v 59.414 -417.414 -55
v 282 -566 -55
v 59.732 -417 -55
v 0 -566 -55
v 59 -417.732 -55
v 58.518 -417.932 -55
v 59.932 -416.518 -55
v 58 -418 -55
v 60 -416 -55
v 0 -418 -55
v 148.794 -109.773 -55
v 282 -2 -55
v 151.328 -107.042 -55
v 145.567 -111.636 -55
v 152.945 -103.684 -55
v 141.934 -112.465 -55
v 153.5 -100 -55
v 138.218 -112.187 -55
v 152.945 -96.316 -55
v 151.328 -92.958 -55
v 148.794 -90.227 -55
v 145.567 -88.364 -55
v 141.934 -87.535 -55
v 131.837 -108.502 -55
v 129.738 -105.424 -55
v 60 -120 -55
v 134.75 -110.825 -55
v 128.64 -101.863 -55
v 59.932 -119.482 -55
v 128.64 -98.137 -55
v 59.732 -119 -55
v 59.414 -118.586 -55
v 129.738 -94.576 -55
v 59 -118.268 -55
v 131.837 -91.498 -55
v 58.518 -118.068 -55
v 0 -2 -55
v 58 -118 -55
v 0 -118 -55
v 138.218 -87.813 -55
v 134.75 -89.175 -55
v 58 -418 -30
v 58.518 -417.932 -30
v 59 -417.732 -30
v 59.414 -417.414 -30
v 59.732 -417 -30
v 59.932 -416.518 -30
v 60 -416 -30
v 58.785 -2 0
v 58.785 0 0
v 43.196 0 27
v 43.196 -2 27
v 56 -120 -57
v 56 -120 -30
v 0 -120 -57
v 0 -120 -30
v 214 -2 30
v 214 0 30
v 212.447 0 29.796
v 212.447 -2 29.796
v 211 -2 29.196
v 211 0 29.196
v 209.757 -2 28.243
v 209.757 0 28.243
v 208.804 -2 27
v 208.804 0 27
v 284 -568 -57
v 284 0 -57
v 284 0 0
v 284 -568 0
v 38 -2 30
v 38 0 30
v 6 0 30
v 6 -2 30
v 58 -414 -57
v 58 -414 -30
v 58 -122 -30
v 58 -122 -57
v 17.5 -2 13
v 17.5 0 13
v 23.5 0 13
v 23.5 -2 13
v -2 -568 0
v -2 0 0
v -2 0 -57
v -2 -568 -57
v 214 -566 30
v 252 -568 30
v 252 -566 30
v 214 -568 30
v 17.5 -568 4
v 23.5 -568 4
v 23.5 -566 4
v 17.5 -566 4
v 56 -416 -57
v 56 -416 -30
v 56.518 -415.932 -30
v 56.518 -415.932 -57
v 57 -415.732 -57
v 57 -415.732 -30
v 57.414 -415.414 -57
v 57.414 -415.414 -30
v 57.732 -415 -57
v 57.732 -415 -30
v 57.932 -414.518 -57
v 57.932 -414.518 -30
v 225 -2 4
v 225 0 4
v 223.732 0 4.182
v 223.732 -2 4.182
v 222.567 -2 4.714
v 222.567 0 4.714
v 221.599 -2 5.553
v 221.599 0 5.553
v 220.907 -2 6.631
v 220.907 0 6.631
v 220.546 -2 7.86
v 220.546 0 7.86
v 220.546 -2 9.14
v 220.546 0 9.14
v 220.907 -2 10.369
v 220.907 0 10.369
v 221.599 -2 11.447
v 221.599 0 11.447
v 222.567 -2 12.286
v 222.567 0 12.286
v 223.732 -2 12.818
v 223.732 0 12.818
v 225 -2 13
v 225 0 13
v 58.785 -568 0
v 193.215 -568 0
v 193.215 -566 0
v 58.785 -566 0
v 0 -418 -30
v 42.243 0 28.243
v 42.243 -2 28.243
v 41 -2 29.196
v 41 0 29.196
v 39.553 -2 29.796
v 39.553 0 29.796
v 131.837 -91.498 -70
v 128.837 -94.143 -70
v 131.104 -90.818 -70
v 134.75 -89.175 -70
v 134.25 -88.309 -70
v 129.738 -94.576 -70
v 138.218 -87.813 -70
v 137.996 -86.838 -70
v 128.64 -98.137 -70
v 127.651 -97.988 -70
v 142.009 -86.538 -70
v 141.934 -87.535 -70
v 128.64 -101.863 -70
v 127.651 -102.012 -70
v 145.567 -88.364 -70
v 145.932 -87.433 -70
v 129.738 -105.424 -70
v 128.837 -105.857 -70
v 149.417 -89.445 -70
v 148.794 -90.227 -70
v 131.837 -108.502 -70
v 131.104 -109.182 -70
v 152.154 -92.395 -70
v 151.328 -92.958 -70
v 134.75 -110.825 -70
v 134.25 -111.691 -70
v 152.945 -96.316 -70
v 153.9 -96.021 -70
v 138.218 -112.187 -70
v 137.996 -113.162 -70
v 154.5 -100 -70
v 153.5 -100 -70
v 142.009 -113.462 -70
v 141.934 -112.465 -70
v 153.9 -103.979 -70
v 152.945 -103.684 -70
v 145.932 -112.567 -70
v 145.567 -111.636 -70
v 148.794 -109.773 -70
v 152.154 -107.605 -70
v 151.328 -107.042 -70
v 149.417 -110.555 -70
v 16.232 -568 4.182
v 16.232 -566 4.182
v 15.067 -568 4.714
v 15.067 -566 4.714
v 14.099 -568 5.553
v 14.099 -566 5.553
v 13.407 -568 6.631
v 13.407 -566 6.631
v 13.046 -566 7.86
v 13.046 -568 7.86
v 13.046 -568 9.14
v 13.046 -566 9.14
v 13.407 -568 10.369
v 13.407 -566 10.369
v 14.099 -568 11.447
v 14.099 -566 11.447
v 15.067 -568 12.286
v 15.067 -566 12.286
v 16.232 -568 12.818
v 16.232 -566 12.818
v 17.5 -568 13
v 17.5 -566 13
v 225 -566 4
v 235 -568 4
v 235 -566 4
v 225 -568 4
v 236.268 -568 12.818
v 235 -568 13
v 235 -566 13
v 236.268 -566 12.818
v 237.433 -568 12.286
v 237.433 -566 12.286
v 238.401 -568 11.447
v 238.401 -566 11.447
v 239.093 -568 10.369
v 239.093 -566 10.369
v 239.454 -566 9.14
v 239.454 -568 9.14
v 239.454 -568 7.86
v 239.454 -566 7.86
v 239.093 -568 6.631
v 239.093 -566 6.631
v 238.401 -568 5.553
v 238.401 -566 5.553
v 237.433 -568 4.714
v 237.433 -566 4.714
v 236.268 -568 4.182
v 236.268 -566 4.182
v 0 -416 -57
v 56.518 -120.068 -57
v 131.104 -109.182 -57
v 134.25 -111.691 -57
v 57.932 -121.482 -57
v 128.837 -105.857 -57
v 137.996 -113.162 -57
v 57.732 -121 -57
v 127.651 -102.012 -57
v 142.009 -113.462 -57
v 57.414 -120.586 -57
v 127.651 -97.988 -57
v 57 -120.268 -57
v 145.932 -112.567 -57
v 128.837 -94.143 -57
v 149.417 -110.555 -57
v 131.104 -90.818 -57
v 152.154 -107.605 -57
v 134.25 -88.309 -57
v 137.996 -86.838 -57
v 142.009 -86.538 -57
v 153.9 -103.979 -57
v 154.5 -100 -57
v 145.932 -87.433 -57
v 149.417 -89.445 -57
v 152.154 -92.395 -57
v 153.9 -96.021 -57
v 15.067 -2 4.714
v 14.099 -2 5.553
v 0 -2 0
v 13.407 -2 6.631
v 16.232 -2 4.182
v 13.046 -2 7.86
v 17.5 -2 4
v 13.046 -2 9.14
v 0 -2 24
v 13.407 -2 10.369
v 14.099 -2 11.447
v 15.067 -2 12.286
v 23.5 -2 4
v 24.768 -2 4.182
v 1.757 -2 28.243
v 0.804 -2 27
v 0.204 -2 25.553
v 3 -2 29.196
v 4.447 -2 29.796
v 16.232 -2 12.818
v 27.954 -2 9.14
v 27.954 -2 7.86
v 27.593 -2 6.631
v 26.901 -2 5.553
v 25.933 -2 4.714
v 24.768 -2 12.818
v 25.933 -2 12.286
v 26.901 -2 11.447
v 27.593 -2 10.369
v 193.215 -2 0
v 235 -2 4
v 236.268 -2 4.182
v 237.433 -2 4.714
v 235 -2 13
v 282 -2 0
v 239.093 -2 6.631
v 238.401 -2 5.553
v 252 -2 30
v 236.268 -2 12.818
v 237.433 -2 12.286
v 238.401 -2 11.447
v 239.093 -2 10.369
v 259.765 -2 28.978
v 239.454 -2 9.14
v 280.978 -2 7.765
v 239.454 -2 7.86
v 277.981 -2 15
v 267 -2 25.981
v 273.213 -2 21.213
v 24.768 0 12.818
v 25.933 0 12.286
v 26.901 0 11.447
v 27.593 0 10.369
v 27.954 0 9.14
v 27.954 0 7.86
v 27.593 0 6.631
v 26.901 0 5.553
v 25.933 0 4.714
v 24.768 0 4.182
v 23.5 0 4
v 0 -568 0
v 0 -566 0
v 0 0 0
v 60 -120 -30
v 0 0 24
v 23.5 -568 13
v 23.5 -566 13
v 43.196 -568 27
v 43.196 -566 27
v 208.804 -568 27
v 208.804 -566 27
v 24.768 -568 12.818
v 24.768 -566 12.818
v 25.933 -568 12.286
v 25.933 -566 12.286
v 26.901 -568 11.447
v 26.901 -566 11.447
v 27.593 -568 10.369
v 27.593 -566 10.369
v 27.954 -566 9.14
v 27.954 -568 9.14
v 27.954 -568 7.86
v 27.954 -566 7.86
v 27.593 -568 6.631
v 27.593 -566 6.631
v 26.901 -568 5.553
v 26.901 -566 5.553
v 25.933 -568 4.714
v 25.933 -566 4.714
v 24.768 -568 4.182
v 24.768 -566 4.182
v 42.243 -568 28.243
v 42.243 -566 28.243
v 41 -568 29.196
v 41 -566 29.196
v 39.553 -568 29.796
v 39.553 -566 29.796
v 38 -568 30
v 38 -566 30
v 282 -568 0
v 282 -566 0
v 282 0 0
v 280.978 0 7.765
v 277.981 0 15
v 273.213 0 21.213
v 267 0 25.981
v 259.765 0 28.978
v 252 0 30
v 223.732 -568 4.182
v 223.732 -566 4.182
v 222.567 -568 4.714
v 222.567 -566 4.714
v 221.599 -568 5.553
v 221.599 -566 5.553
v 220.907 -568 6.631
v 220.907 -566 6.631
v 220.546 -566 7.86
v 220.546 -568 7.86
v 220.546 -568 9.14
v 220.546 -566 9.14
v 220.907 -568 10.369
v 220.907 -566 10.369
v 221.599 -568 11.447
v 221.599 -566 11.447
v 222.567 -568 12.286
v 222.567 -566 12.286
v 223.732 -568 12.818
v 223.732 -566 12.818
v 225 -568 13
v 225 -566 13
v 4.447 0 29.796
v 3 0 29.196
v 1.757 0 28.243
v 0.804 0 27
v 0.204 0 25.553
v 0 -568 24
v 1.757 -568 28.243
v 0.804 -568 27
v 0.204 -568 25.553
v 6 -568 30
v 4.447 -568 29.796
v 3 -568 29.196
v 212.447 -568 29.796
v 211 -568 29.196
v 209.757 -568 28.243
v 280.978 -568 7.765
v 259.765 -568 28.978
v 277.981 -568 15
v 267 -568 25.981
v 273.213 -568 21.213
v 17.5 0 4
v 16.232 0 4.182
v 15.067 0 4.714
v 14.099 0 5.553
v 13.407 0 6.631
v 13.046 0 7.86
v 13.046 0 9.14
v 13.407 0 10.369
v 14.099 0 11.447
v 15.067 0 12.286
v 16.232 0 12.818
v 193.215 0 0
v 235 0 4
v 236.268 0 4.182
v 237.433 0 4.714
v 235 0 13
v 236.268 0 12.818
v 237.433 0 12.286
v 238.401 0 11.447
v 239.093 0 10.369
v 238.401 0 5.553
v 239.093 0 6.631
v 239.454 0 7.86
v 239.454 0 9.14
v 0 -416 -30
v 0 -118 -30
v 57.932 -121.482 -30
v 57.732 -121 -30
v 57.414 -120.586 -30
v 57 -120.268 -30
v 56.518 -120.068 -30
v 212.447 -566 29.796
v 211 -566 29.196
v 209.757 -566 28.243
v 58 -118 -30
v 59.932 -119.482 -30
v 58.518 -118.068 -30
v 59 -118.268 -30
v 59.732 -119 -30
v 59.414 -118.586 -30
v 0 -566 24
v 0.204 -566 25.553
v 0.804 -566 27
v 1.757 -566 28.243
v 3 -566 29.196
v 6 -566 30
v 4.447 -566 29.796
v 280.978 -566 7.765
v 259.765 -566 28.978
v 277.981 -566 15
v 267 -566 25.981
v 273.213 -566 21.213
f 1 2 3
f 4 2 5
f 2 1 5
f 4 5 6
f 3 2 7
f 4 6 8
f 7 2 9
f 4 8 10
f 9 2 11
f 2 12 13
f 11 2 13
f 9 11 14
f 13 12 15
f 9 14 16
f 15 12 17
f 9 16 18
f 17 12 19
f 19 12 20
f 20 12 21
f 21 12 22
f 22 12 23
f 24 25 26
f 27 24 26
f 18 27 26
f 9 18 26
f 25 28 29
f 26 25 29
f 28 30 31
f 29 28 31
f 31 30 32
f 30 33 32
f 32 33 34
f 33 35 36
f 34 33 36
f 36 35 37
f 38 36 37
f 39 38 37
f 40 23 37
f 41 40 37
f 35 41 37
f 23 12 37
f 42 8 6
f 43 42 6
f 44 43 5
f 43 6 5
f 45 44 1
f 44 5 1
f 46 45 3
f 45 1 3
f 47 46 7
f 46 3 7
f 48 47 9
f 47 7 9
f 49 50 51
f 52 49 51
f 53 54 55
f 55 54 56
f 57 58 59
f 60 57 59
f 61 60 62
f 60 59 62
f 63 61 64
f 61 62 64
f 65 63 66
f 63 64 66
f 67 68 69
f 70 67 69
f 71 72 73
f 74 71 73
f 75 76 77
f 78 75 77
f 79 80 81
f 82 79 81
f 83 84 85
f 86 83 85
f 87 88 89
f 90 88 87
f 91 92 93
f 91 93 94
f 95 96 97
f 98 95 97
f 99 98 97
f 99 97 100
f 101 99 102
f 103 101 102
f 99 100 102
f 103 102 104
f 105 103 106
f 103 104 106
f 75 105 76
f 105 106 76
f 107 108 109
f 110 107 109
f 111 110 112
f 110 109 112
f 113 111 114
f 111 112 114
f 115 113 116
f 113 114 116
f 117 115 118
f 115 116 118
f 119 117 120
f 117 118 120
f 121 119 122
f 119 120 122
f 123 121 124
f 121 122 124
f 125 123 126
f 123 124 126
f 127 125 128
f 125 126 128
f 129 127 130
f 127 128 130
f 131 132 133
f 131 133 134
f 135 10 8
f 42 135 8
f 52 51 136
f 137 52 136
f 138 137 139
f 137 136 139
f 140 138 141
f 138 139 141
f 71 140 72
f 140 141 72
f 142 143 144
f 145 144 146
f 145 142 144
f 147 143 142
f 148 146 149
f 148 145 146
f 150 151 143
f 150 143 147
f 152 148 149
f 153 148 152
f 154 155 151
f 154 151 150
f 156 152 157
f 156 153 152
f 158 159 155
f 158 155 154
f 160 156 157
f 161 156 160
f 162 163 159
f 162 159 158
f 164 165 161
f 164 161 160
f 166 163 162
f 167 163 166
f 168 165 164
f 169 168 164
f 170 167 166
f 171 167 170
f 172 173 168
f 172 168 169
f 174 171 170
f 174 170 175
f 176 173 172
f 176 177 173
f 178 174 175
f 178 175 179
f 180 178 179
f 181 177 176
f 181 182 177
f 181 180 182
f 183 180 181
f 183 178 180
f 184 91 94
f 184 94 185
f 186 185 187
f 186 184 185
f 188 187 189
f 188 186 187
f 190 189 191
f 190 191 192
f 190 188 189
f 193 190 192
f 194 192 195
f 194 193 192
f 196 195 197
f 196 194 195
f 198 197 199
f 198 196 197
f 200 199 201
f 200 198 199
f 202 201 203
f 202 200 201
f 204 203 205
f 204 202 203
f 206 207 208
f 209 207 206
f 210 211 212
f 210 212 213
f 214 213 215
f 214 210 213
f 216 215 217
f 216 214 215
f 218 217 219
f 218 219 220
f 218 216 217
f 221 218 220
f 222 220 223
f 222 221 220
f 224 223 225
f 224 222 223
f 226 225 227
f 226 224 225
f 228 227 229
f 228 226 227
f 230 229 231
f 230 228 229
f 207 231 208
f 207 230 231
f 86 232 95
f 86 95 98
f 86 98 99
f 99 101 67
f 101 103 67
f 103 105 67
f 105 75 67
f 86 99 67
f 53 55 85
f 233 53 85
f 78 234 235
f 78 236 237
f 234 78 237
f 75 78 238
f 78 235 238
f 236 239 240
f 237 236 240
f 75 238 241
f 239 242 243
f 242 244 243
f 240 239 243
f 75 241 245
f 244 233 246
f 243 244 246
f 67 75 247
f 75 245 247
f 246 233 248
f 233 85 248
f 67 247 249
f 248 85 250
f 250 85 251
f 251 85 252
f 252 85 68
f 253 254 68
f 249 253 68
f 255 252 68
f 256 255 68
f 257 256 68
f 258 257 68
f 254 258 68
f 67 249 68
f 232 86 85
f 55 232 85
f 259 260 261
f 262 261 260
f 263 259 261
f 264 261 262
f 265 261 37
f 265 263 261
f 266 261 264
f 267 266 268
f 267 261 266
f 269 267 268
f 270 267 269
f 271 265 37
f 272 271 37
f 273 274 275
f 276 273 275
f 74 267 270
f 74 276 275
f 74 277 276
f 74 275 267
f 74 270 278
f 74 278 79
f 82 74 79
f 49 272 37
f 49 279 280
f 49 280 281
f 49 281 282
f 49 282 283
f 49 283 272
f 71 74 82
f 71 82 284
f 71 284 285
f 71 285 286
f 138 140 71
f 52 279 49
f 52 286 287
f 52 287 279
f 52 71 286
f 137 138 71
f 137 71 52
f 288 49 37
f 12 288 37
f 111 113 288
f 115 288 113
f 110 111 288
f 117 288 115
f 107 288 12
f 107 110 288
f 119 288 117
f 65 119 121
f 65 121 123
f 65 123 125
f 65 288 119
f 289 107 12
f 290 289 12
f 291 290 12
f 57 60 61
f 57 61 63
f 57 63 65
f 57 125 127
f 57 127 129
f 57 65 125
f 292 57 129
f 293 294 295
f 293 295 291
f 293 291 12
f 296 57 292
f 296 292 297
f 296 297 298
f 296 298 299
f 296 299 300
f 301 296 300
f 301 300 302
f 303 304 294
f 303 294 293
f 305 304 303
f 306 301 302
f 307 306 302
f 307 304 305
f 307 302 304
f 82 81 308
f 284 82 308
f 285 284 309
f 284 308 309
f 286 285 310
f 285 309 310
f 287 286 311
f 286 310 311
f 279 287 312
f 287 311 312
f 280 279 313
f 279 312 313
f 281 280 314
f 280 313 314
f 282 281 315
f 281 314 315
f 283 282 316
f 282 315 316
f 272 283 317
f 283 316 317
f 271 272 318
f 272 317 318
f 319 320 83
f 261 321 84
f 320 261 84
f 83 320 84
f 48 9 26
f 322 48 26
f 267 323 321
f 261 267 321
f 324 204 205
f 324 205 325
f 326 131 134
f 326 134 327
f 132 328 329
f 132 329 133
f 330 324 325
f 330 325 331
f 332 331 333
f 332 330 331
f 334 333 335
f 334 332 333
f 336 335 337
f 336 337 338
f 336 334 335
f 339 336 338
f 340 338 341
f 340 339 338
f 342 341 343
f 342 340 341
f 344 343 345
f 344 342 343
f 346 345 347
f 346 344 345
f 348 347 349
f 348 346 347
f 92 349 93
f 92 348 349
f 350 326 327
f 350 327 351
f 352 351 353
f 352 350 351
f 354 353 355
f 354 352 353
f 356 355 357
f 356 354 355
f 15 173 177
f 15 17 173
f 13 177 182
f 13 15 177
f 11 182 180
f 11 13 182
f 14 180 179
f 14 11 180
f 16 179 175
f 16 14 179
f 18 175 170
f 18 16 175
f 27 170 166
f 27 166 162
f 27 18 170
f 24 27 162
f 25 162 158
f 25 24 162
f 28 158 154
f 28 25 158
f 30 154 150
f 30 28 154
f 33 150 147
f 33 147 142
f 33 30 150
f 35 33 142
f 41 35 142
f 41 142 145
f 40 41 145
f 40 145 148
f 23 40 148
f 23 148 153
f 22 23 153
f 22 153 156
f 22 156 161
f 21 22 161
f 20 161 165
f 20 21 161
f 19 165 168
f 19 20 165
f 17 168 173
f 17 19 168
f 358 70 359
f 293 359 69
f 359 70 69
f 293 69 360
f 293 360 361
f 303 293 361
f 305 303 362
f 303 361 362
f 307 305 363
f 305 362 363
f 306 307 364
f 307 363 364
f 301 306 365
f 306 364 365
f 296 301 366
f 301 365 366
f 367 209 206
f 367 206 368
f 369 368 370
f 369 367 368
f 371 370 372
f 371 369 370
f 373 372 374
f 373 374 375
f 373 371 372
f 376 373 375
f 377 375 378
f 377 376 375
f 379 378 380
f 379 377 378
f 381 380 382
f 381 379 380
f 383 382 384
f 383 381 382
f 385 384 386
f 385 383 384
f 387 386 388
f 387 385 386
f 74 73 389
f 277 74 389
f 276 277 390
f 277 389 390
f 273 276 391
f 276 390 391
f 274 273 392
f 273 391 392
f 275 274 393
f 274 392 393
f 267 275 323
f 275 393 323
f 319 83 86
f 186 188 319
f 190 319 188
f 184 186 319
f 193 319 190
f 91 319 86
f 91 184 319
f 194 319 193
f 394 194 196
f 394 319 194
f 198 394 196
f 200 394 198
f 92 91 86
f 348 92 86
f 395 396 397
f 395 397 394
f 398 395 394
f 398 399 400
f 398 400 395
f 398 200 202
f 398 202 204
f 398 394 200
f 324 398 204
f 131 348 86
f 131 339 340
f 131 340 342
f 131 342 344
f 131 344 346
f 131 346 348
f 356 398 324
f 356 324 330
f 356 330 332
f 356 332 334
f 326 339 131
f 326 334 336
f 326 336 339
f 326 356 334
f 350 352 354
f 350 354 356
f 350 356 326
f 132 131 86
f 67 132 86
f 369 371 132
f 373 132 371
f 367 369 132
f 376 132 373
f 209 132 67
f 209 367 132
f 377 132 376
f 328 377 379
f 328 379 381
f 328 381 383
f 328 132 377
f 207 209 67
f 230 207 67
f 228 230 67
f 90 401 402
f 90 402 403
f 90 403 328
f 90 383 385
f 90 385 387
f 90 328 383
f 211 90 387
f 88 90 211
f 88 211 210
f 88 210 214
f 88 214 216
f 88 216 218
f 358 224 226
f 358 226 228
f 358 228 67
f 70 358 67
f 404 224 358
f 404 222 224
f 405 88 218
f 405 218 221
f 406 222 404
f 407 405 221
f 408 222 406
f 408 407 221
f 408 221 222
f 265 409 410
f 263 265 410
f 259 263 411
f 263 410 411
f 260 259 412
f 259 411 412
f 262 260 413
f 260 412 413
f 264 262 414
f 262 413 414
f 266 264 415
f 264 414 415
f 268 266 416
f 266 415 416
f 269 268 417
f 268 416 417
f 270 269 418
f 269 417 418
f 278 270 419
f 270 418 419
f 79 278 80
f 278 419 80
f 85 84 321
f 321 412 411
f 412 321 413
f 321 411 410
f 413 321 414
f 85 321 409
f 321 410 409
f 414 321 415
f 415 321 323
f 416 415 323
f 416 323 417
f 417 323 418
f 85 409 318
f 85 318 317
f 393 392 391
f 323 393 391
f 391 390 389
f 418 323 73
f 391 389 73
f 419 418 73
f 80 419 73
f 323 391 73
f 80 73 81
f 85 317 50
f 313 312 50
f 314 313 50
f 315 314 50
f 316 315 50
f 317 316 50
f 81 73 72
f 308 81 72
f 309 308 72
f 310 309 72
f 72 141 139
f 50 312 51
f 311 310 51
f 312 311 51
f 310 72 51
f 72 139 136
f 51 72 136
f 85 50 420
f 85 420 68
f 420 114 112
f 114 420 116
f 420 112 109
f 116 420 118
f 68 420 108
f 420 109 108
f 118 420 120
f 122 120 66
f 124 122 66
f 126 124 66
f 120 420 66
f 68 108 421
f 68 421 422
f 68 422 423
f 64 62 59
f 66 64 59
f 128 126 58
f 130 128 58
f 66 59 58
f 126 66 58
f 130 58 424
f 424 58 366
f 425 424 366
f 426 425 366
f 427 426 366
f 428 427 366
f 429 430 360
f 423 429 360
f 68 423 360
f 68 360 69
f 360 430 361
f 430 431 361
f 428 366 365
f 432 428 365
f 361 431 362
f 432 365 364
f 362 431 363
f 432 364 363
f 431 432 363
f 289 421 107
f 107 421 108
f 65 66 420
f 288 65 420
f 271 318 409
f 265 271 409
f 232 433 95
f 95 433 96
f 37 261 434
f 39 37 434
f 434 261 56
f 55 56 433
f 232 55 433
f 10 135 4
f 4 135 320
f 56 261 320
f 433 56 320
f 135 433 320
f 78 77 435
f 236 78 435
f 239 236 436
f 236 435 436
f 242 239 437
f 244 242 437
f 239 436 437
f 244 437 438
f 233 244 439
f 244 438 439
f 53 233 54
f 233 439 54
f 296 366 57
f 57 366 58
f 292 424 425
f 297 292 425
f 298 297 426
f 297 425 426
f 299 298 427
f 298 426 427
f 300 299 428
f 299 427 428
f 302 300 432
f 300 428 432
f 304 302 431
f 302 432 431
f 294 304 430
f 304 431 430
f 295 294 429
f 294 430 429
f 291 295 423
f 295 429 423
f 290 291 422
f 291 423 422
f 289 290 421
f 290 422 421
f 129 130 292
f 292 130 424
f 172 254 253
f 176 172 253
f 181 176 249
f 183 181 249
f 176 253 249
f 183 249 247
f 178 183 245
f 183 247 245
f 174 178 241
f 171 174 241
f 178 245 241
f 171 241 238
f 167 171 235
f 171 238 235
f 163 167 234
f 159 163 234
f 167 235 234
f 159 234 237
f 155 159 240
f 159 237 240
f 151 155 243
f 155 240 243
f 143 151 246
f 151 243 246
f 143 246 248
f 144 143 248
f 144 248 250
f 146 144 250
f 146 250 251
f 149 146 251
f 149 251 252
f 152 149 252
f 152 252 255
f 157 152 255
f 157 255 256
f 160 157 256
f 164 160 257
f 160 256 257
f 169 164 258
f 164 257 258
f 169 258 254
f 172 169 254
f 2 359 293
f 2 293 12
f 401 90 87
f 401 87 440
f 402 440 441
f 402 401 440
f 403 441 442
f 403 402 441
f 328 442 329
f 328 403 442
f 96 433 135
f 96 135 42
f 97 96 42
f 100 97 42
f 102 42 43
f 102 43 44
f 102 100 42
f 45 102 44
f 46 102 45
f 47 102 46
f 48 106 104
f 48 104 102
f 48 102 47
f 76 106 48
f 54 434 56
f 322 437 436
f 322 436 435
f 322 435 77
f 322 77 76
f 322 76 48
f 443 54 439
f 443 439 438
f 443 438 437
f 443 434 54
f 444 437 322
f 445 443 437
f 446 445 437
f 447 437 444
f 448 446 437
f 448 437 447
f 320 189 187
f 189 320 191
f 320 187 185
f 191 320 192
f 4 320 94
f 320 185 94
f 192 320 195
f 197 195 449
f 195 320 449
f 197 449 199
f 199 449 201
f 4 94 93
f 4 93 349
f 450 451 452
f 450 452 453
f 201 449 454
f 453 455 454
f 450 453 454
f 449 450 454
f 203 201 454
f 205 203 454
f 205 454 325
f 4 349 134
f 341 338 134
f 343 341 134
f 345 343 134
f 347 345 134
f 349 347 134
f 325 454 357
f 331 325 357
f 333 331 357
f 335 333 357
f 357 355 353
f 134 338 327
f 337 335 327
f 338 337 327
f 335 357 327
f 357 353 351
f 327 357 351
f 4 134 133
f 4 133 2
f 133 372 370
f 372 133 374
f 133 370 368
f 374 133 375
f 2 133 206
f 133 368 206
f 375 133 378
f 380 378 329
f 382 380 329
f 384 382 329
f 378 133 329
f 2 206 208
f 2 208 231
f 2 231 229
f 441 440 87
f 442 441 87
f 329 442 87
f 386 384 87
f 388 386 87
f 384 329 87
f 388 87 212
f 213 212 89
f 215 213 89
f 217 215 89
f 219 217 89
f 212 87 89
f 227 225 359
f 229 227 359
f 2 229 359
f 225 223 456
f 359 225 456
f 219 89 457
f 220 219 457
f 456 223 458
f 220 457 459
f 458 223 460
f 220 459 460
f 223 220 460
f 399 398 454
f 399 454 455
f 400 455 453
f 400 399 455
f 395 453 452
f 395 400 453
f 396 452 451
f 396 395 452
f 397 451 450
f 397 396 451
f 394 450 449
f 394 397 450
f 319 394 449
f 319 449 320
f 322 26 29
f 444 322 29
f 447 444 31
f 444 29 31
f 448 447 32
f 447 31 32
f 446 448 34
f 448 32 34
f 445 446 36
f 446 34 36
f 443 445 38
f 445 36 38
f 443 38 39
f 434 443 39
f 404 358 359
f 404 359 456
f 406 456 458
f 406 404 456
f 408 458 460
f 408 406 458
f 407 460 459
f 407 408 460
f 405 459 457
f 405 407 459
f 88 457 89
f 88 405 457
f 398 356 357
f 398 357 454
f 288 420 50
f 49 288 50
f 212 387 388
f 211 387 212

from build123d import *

# Parameters (mm, degrees)
F1_DEPTH  = 568
F3_DEPTH  = 2
F5_DEPTH  = 2
F6_R      = 12.5
F7_DEPTH  = 25
F8_R      = 13.5
F8_R_2    = 12.5
F9_DEPTH  = 13
F11_DEPTH = 25
F13_DEPTH = 25


with BuildPart() as f1:
    # F0 (on Front) → F1 (new body)
    with BuildSketch(Plane.XZ):
        Polygon((0, -55), (0, 0), (-2, 0), (-2, -57), (284, -57), (284, 0), (282, 0), (282, -55), align=None)
    extrude(amount=F1_DEPTH)

    # F2 (on Front) → F3 (join)
    with BuildSketch(Plane.XZ):
        with BuildLine():
            Line((0, 24), (0, 0))
            Line((0, 0), (0, -55))
            Line((0, -55), (282, -55))
            Line((282, -55), (282, 0))
            ThreePointArc((282, 0), (273.2132034356, 21.2132034356), (252, 30))
            Line((252, 30), (214, 30))
            ThreePointArc((214, 30), (211, 29.1961524227), (208.8038475773, 27))
            Line((208.8038475773, 27), (193.2153903092, 0))
            Line((193.2153903092, 0), (58.7846096908, 0))
            Line((58.7846096908, 0), (43.1961524227, 27))
            ThreePointArc((43.1961524227, 27), (41, 29.1961524227), (38, 30))
            Line((38, 30), (6, 30))
            ThreePointArc((6, 30), (1.7573593129, 28.2426406871), (0, 24))
        make_face()
        with BuildLine():
            ThreePointArc((17.5, 4), (13, 8.5), (17.5, 13))
            Line((17.5, 13), (23.5, 13))
            ThreePointArc((23.5, 13), (28, 8.5), (23.5, 4))
            Line((23.5, 4), (17.5, 4))
        make_face(mode=Mode.SUBTRACT)
        with BuildLine():
            ThreePointArc((225, 4), (220.5, 8.5), (225, 13))
            Line((225, 13), (235, 13))
            ThreePointArc((235, 13), (239.5, 8.5), (235, 4))
            Line((235, 4), (225, 4))
        make_face(mode=Mode.SUBTRACT)
    extrude(amount=F3_DEPTH)

    # F4 (on face) → F5 (join)
    with BuildSketch(Plane.XZ.offset(568)):
        with BuildLine():
            Line((0, 0), (0, -55))
            Line((0, -55), (282, -55))
            Line((282, -55), (282, 0))
            ThreePointArc((282, 0), (273.2132034356, 21.2132034356), (252, 30))
            Line((252, 30), (214, 30))
            ThreePointArc((214, 30), (211, 29.1961524227), (208.8038475773, 27))
            Line((208.8038475773, 27), (193.2153903092, 0))
            Line((193.2153903092, 0), (58.7846096908, 0))
            Line((58.7846096908, 0), (43.1961524227, 27))
            ThreePointArc((43.1961524227, 27), (41, 29.1961524227), (38, 30))
            Line((38, 30), (6, 30))
            ThreePointArc((6, 30), (1.7573593129, 28.2426406871), (0, 24))
            Line((0, 24), (0, 0))
        make_face()
        with BuildLine():
            ThreePointArc((17.5, 4), (13, 8.5), (17.5, 13))
            Line((17.5, 13), (23.5, 13))
            ThreePointArc((23.5, 13), (28, 8.5), (23.5, 4))
            Line((23.5, 4), (17.5, 4))
        make_face(mode=Mode.SUBTRACT)
        with BuildLine():
            ThreePointArc((225, 4), (220.5, 8.5), (225, 13))
            Line((225, 13), (235, 13))
            ThreePointArc((235, 13), (239.5, 8.5), (235, 4))
            Line((235, 4), (225, 4))
        make_face(mode=Mode.SUBTRACT)
    extrude(amount=-F5_DEPTH)

    # F6 (on face) → F7 (cut)
    with BuildSketch(Plane.XY.offset(-55)):
        with Locations((141, -100)):
            Circle(F6_R)
    extrude(amount=-F7_DEPTH, mode=Mode.SUBTRACT)

    # F8 (on face) → F9 (join)
    with BuildSketch(Plane(origin=(0, 0, -57), x_dir=(1, 0, 0), z_dir=(0, 0, -1))):
        with Locations((141, 100)):
            Circle(F8_R)
        with Locations((141, 100)):
            Circle(F8_R_2, mode=Mode.SUBTRACT)
    extrude(amount=F9_DEPTH)

    # F10 (on face) → F11 (join)
    with BuildSketch(Plane.XY.offset(-55)):
        with BuildLine():
            ThreePointArc((60, -120), (59.4142135624, -118.5857864376), (58, -118))
            Line((58, -118), (0, -118))
            Line((0, -118), (0, -120))
            Line((0, -120), (56, -120))
            ThreePointArc((56, -120), (57.4142135624, -120.5857864376), (58, -122))
            Line((58, -122), (58, -414))
            ThreePointArc((58, -414), (57.4142135624, -415.4142135624), (56, -416))
            Line((56, -416), (0, -416))
            Line((0, -416), (0, -418))
            Line((0, -418), (58, -418))
            ThreePointArc((58, -418), (59.4142135624, -417.4142135624), (60, -416))
            Line((60, -416), (60, -120))
        make_face()
    extrude(amount=F11_DEPTH)

    # F12 (on face) → F13 (cut)
    with BuildSketch(Plane.XY.offset(-55)):
        with BuildLine():
            Line((58, -414), (58, -122))
            ThreePointArc((58, -122), (57.4142135624, -120.5857864376), (56, -120))
            Line((56, -120), (0, -120))
            Line((0, -120), (0, -416))
            Line((0, -416), (56, -416))
            ThreePointArc((56, -416), (57.4142135624, -415.4142135624), (58, -414))
        make_face()
    extrude(amount=-F13_DEPTH, mode=Mode.SUBTRACT)


solid = f1.part
